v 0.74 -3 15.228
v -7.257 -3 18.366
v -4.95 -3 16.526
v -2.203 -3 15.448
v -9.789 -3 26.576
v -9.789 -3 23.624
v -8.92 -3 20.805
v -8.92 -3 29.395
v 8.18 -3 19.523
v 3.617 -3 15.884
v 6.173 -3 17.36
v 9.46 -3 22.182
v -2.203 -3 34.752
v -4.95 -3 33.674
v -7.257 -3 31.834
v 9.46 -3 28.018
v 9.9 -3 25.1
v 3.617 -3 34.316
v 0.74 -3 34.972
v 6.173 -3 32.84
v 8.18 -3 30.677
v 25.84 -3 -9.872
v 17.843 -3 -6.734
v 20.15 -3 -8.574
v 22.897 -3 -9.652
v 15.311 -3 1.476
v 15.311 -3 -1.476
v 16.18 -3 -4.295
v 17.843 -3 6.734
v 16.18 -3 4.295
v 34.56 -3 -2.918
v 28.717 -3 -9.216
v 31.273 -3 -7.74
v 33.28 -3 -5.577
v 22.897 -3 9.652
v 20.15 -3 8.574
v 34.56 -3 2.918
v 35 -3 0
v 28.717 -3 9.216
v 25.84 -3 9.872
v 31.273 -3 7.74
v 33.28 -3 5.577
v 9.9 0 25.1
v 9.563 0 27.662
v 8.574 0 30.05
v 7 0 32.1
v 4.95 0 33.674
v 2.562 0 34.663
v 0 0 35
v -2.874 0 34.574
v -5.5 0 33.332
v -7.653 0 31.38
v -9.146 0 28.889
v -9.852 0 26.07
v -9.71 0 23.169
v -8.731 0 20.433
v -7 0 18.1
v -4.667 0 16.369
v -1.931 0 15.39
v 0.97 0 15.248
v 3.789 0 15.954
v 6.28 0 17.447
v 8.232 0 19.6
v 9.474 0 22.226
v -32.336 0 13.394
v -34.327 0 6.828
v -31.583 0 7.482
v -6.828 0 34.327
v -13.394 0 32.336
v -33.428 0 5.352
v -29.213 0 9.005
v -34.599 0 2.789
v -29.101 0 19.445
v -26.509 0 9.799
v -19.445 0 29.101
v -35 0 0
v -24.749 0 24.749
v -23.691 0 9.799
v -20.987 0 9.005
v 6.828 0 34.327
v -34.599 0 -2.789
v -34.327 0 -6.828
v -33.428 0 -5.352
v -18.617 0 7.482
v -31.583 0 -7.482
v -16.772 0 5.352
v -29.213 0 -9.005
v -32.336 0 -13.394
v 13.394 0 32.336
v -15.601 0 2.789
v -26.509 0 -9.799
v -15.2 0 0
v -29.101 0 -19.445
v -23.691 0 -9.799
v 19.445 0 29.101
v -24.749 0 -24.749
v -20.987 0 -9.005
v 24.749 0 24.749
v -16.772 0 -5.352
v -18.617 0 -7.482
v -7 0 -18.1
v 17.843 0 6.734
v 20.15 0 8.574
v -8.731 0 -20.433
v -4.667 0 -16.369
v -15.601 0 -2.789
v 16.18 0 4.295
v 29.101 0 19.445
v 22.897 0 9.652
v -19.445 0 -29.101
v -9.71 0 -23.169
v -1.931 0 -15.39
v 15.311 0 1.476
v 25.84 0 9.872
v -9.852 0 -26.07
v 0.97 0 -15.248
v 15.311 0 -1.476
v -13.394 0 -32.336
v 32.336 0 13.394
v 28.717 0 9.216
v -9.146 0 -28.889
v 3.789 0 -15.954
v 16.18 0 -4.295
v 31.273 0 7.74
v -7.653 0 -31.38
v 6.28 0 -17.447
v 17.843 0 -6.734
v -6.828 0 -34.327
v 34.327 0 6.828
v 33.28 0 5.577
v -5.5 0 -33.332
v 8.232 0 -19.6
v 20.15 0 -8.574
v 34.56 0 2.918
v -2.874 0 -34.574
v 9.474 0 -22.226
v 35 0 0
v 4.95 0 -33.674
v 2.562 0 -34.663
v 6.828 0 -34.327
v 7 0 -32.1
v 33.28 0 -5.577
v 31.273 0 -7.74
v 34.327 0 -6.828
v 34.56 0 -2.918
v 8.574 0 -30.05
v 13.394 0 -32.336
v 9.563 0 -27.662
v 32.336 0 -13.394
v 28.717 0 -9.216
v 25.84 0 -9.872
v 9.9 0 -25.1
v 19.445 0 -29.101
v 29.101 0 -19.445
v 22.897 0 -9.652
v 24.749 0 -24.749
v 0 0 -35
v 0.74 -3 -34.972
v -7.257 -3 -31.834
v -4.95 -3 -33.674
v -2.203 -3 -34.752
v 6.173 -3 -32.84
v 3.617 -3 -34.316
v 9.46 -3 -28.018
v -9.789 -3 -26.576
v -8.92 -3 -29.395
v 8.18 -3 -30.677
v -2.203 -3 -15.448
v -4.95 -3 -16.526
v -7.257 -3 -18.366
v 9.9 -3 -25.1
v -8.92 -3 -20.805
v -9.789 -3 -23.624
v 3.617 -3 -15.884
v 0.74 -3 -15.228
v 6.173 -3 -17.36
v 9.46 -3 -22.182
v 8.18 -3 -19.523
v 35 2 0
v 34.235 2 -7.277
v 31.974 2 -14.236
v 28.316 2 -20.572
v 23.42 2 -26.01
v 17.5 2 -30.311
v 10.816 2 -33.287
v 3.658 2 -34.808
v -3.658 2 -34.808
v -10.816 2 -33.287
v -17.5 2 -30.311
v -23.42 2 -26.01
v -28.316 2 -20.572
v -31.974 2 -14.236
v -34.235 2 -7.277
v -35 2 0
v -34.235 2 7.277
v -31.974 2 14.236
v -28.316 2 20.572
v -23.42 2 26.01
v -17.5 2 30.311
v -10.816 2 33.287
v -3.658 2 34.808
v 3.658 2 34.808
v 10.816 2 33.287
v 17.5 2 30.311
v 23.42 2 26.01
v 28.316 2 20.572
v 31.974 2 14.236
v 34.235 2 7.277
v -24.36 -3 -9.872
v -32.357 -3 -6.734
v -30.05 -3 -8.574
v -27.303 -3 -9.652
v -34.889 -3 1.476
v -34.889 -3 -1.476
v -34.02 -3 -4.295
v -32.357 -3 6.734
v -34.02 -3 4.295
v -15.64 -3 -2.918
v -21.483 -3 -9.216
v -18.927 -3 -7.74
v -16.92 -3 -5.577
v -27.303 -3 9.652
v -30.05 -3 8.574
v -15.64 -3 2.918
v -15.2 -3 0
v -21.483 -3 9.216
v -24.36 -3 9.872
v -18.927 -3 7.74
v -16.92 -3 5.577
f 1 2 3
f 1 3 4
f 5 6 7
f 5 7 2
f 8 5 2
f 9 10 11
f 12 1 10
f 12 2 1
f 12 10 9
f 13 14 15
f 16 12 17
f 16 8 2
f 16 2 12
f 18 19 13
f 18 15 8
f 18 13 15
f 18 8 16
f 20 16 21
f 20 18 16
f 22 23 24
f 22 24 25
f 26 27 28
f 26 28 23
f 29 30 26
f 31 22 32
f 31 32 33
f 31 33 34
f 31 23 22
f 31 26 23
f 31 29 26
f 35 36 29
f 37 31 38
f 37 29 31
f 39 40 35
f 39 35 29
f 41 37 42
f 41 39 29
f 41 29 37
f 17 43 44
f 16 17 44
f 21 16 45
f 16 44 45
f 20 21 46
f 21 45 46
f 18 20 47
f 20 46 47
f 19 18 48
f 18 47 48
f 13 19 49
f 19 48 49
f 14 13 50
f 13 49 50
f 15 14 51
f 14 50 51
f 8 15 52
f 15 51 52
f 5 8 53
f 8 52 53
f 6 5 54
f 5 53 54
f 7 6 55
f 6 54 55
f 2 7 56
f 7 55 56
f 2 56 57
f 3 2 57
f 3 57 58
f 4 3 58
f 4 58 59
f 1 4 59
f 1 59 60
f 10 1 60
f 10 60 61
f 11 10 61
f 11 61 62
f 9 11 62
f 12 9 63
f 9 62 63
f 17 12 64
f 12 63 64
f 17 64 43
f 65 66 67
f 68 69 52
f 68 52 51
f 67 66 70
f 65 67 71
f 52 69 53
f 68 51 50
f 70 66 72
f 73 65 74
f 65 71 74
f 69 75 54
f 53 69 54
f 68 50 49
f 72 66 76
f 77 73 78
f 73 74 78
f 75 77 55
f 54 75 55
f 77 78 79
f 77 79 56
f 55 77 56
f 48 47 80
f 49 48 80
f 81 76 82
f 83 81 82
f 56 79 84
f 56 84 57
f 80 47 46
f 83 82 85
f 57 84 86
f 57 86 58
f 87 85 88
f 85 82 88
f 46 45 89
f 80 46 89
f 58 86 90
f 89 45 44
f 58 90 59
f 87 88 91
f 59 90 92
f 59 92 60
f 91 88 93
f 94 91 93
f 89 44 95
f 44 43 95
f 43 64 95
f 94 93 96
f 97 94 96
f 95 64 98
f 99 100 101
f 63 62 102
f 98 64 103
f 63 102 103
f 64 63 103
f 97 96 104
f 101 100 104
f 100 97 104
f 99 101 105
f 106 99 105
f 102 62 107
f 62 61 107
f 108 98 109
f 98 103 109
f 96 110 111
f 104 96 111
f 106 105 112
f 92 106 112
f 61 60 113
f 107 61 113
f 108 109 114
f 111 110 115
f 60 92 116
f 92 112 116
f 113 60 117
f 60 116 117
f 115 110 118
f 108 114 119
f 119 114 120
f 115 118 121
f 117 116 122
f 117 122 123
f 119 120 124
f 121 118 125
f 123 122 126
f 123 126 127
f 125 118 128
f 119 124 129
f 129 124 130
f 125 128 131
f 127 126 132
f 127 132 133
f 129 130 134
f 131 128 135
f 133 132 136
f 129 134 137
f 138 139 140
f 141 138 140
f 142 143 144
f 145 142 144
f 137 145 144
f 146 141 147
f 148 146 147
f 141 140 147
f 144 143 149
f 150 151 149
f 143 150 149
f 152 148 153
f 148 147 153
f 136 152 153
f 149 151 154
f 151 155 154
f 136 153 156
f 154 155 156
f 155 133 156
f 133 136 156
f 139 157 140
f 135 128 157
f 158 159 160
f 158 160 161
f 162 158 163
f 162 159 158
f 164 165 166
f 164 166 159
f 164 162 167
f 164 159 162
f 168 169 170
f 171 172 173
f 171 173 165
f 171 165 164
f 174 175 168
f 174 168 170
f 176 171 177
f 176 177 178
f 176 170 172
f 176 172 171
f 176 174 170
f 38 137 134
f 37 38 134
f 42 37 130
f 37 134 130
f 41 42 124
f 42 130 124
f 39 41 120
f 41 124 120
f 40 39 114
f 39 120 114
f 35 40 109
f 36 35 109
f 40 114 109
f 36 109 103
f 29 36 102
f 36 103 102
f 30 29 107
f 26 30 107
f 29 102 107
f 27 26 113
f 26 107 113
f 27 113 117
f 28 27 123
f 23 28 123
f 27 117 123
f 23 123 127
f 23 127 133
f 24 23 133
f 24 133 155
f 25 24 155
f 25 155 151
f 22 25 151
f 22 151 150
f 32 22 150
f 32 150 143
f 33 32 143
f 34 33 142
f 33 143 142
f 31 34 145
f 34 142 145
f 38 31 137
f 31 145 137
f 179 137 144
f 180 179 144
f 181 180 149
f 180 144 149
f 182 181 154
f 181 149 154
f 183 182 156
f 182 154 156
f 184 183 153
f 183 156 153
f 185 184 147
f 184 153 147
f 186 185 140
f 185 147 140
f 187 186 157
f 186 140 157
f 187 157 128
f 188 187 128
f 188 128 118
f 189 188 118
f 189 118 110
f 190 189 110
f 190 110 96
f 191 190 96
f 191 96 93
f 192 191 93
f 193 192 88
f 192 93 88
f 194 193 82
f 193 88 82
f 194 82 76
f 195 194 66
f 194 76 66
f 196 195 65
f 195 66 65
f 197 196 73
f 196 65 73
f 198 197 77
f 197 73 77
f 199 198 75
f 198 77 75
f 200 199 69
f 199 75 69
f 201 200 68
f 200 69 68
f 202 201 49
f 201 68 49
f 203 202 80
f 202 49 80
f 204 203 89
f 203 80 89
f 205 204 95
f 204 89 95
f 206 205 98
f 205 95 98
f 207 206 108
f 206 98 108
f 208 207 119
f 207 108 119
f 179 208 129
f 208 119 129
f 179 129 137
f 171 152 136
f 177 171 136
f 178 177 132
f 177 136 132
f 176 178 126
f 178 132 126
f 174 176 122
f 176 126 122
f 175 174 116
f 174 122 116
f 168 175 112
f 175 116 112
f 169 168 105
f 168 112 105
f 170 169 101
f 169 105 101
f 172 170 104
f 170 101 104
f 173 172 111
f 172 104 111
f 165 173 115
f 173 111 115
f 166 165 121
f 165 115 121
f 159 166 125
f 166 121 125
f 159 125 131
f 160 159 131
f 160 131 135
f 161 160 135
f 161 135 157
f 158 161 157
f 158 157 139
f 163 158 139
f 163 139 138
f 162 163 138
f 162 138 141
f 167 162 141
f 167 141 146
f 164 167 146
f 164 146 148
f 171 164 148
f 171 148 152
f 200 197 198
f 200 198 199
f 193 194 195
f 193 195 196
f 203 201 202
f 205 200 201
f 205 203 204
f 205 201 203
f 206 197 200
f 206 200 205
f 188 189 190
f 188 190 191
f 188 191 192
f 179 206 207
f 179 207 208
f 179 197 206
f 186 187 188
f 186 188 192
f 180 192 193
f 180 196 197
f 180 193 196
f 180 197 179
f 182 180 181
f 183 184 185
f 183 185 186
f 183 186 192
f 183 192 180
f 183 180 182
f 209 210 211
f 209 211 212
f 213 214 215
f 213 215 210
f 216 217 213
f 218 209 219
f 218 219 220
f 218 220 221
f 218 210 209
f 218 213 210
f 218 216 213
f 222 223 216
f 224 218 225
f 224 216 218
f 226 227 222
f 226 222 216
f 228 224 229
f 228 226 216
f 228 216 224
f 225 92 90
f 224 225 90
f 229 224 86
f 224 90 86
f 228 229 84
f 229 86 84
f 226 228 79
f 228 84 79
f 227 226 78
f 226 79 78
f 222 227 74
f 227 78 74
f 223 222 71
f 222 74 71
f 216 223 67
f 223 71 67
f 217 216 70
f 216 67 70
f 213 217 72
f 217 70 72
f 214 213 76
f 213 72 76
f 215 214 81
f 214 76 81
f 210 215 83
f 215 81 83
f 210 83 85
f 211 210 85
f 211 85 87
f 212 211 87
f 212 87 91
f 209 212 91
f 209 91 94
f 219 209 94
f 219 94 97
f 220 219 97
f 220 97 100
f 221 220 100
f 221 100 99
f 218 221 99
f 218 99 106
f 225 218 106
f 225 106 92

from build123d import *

# Parameters (mm, degrees)
SKETCH1_R           = 35
BOSS_EXTRUDE1_DEPTH = 2
SKETCH3_R           = 9.9
BOSS_EXTRUDE2_DEPTH = 3


with BuildPart() as part:
    # Sketch1 → Boss-Extrude1 (new body)
    with BuildSketch(Plane(origin=(0, 0, 0), x_dir=(1, 0, 0), z_dir=(0, 1, 0))):
        Circle(SKETCH1_R)
    extrude(amount=BOSS_EXTRUDE1_DEPTH)

    # Sketch3 → Boss-Extrude2 (add)
    with BuildSketch(Plane.XZ):
        with Locations((25.1, 0)):
            Circle(SKETCH3_R)
        with Locations((0, -25.1)):
            Circle(SKETCH3_R)
        with Locations((-25.1, 0)):
            Circle(SKETCH3_R)
        with Locations((0, 25.1)):
            Circle(SKETCH3_R)
    extrude(amount=BOSS_EXTRUDE2_DEPTH)


solid = part.part
